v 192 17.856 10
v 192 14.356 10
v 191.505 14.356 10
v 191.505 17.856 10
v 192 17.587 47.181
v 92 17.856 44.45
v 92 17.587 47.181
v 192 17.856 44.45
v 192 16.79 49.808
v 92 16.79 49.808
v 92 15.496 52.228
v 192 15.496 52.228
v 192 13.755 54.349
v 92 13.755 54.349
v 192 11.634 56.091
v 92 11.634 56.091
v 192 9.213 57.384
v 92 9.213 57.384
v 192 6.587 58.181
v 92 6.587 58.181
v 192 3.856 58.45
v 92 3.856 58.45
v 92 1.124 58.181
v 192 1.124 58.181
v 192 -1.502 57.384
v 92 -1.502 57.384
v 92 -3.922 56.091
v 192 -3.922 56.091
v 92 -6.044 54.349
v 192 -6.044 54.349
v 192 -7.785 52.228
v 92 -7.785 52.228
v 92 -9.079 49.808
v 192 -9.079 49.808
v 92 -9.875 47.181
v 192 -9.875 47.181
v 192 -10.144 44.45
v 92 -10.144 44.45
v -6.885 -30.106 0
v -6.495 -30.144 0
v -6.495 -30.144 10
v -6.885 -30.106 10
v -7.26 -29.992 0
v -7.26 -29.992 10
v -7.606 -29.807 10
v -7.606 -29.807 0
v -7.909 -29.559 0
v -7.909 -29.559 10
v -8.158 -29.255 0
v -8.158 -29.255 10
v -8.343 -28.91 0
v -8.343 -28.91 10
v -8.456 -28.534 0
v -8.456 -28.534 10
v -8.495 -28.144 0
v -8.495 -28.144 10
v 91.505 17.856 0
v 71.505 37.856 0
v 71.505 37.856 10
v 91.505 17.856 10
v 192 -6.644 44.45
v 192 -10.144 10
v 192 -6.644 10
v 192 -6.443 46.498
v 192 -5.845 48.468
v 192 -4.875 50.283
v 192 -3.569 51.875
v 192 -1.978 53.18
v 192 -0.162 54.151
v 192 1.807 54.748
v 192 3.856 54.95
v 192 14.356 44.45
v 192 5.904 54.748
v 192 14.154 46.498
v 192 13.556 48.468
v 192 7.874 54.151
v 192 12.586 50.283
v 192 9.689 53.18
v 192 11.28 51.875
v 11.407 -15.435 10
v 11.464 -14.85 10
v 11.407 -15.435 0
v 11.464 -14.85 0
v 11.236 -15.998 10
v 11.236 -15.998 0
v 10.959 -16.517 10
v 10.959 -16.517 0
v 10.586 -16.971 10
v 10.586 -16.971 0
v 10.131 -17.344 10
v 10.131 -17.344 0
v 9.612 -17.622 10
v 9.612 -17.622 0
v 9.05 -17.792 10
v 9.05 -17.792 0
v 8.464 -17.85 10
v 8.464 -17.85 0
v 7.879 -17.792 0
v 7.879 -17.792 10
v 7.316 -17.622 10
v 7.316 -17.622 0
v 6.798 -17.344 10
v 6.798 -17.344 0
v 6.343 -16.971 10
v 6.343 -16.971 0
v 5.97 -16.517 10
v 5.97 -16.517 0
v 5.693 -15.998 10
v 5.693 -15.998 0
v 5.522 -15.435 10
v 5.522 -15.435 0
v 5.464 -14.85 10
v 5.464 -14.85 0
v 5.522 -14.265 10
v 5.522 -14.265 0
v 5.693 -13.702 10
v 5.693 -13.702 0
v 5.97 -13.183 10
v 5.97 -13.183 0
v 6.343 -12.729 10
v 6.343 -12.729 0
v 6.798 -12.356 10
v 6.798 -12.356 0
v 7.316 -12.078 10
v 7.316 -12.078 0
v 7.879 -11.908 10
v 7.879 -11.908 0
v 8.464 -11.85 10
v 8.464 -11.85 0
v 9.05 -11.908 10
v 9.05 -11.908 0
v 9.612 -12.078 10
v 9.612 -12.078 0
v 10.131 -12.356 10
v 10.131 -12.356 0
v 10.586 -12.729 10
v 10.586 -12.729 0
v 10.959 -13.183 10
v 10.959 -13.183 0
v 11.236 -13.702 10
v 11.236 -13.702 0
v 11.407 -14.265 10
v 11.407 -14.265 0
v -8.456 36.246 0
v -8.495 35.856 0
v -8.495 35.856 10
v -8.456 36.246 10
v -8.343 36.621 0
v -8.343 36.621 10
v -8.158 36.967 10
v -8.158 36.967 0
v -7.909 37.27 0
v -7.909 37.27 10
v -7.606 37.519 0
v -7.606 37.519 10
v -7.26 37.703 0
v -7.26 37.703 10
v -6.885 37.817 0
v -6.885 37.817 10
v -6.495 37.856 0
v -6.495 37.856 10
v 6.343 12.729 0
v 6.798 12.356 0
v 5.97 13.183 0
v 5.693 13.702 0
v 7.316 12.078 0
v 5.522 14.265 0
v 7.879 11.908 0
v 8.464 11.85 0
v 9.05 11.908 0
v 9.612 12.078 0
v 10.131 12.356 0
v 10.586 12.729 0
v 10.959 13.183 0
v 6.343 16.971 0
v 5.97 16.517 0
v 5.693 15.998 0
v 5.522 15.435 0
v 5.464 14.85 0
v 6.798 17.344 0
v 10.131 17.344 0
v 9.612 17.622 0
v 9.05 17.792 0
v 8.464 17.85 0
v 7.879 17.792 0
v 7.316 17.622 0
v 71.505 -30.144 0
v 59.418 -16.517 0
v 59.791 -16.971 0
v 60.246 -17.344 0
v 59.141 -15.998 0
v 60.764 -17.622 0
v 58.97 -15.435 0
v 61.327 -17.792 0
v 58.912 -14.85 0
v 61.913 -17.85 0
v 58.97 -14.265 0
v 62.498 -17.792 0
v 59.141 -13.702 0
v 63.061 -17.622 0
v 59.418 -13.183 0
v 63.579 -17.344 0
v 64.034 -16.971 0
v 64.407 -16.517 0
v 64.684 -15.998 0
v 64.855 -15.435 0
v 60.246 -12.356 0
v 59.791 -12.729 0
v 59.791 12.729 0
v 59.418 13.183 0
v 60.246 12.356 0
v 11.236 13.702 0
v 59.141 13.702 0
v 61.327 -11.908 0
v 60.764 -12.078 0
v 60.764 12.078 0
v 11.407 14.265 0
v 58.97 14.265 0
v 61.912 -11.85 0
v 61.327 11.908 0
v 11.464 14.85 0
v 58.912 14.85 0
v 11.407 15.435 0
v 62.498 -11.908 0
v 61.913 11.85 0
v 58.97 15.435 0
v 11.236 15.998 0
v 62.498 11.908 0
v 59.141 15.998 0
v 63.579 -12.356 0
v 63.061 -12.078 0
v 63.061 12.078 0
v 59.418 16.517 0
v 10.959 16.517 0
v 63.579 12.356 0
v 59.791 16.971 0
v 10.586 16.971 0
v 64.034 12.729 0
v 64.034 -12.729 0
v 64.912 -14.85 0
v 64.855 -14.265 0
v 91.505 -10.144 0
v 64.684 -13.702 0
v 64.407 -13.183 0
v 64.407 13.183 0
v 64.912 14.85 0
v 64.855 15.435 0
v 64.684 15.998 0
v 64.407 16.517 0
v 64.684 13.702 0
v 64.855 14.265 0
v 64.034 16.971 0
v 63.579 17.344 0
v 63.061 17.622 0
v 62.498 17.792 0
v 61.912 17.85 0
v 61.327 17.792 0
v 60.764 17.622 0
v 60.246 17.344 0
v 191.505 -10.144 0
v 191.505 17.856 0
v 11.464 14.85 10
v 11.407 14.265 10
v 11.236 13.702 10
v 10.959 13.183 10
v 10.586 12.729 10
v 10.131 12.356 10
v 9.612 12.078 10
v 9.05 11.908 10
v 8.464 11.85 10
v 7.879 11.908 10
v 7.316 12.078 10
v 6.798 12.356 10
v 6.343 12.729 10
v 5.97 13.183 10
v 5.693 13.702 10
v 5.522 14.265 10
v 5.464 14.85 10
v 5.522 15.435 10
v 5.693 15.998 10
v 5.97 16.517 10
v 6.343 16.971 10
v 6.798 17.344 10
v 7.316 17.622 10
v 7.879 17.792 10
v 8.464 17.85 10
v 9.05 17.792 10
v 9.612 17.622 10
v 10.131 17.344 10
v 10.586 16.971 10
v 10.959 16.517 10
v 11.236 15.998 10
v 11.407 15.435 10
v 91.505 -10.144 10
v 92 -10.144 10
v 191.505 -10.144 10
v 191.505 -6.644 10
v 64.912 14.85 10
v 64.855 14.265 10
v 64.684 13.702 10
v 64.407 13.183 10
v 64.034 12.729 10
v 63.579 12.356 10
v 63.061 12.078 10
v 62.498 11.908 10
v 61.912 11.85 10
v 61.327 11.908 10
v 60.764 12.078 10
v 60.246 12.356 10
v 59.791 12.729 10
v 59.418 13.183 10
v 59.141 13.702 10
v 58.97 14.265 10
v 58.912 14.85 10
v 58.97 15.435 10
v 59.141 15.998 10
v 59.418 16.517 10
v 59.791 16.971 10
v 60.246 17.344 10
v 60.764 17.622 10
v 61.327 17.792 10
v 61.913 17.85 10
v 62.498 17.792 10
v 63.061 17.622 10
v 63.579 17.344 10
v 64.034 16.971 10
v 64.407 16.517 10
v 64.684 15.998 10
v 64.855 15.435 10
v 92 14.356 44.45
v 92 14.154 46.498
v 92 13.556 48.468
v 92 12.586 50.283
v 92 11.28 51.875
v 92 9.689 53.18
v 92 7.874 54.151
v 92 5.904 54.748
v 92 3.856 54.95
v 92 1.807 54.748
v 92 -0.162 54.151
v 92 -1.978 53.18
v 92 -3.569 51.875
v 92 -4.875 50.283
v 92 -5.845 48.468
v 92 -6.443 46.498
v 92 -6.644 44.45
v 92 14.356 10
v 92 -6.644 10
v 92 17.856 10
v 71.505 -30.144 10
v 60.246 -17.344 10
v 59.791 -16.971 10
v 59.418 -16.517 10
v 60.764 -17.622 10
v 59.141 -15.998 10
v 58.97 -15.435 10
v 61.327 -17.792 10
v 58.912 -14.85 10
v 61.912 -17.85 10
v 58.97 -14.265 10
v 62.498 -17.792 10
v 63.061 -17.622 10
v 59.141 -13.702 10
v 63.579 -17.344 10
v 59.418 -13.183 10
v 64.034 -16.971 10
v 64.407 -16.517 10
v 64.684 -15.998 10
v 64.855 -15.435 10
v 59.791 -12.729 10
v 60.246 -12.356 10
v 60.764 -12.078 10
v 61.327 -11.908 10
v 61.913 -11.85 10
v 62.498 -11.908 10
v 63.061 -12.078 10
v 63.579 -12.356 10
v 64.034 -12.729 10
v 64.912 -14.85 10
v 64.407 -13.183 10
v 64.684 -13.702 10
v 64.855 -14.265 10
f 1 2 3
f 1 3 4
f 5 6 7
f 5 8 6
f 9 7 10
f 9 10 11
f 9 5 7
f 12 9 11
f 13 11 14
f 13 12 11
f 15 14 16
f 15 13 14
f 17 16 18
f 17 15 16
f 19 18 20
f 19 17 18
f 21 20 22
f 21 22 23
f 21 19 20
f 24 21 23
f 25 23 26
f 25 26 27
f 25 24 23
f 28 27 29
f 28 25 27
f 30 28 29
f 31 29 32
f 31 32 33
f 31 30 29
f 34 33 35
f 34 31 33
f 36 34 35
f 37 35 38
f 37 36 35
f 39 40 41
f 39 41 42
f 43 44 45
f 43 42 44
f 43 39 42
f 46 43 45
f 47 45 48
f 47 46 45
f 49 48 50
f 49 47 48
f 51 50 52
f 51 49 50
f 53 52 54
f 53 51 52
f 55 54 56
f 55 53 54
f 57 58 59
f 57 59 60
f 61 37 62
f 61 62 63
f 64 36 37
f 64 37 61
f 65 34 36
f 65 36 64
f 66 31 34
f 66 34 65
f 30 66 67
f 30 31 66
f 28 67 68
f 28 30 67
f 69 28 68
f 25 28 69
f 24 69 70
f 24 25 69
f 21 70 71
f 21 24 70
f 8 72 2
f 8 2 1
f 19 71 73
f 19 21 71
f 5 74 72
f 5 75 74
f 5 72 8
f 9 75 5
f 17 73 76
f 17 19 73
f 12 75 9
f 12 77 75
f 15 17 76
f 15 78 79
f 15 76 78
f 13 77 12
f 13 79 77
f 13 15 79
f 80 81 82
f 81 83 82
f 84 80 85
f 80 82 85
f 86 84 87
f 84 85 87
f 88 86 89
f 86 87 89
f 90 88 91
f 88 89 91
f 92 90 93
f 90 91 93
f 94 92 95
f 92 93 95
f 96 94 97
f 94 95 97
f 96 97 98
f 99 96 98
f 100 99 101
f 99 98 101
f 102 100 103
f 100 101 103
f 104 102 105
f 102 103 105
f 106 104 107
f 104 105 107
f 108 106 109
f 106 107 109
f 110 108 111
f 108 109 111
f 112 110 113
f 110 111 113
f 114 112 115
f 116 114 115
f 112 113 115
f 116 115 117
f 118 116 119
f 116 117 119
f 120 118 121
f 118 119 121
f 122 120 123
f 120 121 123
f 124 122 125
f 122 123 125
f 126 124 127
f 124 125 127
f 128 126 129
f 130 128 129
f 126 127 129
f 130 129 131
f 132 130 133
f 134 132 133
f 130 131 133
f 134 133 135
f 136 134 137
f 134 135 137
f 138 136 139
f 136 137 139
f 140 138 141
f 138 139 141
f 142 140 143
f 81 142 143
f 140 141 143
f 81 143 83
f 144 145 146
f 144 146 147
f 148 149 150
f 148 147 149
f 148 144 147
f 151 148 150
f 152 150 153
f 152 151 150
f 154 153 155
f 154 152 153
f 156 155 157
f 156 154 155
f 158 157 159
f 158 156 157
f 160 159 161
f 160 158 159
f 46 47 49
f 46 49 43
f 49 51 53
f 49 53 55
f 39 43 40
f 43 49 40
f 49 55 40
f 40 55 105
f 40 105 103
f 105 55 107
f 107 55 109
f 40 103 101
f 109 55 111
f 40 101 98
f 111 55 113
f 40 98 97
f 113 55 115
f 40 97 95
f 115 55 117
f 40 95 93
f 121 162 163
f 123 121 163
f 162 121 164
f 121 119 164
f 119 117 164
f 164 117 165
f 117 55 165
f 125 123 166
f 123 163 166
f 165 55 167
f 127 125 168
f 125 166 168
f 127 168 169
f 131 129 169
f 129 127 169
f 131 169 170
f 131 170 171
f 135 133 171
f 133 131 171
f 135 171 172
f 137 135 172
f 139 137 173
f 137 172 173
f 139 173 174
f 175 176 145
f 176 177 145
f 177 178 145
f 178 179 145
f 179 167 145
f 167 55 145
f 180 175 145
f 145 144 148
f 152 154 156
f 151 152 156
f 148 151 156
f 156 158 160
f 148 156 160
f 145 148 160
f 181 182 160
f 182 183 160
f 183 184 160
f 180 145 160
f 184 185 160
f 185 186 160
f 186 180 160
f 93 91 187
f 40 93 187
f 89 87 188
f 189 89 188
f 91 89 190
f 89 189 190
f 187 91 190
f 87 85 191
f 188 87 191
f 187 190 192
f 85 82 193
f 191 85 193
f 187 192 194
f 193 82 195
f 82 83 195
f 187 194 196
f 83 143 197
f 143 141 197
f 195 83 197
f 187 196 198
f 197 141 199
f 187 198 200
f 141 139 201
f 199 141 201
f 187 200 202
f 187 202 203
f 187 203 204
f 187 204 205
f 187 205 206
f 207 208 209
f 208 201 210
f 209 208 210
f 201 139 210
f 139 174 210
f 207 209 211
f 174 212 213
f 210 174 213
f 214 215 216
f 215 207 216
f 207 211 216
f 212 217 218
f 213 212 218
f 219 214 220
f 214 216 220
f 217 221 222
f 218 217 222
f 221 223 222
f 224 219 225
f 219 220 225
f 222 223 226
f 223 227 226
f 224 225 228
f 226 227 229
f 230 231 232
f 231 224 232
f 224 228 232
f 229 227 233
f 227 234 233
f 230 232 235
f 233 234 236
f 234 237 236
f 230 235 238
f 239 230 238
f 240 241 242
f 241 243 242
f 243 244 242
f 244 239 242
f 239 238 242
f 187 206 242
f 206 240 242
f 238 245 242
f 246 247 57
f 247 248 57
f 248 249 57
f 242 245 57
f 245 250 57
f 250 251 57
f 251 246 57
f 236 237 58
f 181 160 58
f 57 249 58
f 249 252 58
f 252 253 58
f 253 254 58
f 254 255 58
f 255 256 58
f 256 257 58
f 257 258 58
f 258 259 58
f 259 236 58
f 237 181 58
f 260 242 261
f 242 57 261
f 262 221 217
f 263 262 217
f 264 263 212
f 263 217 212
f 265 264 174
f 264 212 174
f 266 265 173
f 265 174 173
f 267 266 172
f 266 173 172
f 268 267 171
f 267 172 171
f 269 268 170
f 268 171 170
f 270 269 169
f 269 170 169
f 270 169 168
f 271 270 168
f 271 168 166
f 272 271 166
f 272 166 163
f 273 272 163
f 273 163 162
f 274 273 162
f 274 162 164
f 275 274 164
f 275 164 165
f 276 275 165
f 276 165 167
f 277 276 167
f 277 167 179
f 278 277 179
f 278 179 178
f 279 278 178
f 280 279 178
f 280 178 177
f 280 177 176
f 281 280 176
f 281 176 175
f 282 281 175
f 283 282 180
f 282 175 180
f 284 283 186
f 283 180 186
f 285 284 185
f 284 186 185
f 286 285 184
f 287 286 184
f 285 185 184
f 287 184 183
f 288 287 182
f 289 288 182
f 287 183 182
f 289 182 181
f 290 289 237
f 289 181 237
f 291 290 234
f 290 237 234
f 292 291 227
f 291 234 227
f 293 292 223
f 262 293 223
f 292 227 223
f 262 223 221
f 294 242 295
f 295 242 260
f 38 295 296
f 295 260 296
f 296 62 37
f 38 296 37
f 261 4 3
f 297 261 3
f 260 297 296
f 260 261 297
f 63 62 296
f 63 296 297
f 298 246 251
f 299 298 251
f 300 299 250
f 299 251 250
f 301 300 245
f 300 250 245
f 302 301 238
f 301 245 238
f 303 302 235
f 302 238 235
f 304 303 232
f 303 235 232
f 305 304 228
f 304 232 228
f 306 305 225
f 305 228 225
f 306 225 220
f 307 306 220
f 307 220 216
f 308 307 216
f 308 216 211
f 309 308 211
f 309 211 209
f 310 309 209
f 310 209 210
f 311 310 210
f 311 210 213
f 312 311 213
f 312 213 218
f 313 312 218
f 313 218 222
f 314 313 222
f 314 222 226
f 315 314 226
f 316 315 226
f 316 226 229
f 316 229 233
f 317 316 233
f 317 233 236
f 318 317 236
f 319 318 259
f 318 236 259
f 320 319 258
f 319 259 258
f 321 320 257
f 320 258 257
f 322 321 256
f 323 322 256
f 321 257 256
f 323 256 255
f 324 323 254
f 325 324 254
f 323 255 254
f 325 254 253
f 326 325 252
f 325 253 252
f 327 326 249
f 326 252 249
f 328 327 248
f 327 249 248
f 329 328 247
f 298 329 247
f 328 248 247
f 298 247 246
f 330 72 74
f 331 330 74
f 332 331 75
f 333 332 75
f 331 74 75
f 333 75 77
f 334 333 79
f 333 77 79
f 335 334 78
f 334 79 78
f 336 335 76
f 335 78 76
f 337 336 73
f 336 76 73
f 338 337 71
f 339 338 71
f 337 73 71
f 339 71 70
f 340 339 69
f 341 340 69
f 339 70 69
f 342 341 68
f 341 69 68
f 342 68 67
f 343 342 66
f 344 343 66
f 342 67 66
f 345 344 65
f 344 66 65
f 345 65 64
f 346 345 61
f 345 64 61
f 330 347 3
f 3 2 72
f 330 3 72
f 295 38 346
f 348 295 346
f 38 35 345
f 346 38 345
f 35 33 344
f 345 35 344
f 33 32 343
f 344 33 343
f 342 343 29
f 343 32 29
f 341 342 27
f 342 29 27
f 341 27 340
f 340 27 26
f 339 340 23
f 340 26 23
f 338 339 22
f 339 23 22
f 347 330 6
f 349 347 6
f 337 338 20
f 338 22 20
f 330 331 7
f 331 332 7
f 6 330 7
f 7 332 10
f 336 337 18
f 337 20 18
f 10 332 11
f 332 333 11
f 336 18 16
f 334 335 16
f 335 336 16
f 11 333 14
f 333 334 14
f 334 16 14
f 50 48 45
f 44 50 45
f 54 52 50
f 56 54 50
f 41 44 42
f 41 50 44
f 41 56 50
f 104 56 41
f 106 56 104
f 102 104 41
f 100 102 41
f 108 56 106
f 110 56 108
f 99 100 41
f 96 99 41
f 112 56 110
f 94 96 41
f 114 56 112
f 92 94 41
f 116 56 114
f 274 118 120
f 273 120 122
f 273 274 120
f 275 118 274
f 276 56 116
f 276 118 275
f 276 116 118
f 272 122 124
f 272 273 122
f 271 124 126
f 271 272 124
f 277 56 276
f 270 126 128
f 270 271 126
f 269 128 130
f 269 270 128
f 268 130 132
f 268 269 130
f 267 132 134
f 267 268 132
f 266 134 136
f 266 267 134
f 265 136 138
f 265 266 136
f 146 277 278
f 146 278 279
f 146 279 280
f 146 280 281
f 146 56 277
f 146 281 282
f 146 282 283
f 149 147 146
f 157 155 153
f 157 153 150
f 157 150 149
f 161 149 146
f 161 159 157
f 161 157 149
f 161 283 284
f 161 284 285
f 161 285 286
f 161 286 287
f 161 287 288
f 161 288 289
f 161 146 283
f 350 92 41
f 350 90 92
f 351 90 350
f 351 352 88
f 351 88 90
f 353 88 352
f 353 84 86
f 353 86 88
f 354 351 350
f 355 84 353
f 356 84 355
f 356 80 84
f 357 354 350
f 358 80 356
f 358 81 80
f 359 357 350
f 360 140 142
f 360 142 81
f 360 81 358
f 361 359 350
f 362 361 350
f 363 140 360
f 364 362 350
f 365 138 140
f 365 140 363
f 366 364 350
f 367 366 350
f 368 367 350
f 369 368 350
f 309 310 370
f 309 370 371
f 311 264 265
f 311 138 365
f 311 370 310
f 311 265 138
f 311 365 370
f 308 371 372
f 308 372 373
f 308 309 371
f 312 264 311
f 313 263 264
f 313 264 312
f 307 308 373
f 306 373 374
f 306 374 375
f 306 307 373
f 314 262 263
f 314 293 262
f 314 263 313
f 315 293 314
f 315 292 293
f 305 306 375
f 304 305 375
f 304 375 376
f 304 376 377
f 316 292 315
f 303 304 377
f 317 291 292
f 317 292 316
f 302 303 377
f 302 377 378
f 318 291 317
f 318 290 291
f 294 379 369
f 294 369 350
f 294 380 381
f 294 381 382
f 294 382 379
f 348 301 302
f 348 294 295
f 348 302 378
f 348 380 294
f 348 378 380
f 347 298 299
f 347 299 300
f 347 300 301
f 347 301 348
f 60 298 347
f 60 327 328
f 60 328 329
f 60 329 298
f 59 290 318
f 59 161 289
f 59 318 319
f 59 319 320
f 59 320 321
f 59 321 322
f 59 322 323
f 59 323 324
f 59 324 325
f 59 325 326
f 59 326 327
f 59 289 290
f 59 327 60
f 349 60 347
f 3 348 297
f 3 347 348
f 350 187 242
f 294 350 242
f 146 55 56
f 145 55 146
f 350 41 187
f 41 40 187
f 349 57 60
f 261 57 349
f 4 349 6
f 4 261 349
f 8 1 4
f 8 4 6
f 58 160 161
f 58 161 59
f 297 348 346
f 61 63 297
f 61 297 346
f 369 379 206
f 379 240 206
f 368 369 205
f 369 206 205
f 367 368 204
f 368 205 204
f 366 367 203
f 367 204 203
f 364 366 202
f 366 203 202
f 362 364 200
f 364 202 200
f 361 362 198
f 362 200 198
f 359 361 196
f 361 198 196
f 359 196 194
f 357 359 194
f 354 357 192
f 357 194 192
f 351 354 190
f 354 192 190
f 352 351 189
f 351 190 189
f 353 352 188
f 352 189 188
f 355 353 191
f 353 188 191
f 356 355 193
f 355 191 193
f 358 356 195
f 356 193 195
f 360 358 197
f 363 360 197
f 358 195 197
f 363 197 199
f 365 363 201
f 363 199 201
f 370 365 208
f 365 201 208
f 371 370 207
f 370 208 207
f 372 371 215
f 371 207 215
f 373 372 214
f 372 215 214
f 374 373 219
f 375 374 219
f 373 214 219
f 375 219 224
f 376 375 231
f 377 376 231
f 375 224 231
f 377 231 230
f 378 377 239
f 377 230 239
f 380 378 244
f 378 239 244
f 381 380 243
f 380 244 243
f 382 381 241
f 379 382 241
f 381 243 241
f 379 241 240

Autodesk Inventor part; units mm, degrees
ref_plane "XZ Plane" through (0, 0, 0) normal (0, 1, 0) x (-1, 0, 0)
ref_plane "XY Plane" through (0, 0, 0) normal (0, 0, 1) x (1, 0, 0)
sketch "Sketch4" plane through (0, 0, 0) normal (0, 0, 1) x (1, 0, 0)
  line L0 (-8.4948, -28.1443) -> (-8.4948, 35.8557)
  line L1 (-6.4948, 37.8557) -> (71.5052, 37.8557)
  line L2 (71.5052, 37.8557) -> (91.5052, 17.8557)
  line L3 (-6.4948, -30.1443) -> (71.5052, -30.1443)
  line L4 (71.5052, -30.1443) -> (91.5052, -10.1443)
  line L5 (91.5052, -10.1443) -> (91.5052, 17.8557)
  line L6 (91.5052, 17.8557) -> (191.5052, 17.8557)
  line L7 (191.5052, 17.8557) -> (191.5052, -10.1443)
  line L8 (191.5052, -10.1443) -> (91.5052, -10.1443)
  arc A0 (-6.4948, 37.8557) -> (-8.4948, 35.8557) centre (-6.4948, 35.8557) ccw
  arc A1 (-8.4948, -28.1443) -> (-6.4948, -30.1443) centre (-6.4948, -28.1443) ccw
  line L9 (71.5052, 37.8557) -> (91.5052, 17.8557)
  line L10 (71.5052, -30.1443) -> (91.5052, -10.1443)
  line L11 (91.5052, 17.8557) -> (91.5052, -10.1443)
  point P0 (0, 0)
  point P1 (-8.4948, -30.1443)
  point P2 (-8.4948, 37.8557)
  dimension "d7" = 68
  dimension "d8" = 80
  dimension "d9" = 80
  dimension "d10" = 135
  dimension "d11" = 135
  dimension "d12" = 20
  dimension "d13" = 20
  dimension "d14" = 28
  dimension "d15" = 2
  dimension "d16" = 2
  dimension "d19" = 100
extrude "Extrusion2" add sketch "Sketch4" along normal blind 10
ref_plane "Work Plane1" through (192, 0, 0) normal (1, 0, 0) x (0, 1, 0)
sketch "Sketch5" plane through (192, 0, 0) normal (1, 0, 0) x (0, 1, 0)
  line L0 (17.8557, 10) -> (17.8557, 44.45)
  line L1 (-10.1443, 0) -> (-10.1443, 10) projected
  line L2 (-10.1443, 10) -> (-10.1443, 44.45)
  arc A0 (17.8557, 44.45) -> (-10.1443, 44.45) centre (3.8557, 44.45) ccw
  line L3 (14.3557, 10) -> (14.3557, 44.45)
  line L4 (-6.6443, 10) -> (-6.6443, 44.45)
  arc A1 (14.3557, 44.45) -> (-6.6443, 44.45) centre (3.8557, 44.45) ccw
  line L5 (14.3557, 44.45) -> (14.3557, 10)
  line L6 (-6.6443, 44.45) -> (-6.6443, 10)
  line L7 (-10.1443, 10) -> (17.8557, 10) projected
  line L8 (17.8557, 10) -> (14.3557, 10)
  line L9 (-6.6443, 10) -> (-10.1443, 10)
  point P0 (0, 0)
  dimension "d21" = 34.45
  dimension "d22" = 3.5
  dimension "d23" = 3.5
extrude "Extrusion3" add sketch "Sketch5" against normal blind 100 contours L7 L3 A1 L4 L2 A0 L0
sketch "Sketch6" plane through (0, 0, 0) normal (0, 0, 1) x (1, 0, 0)
  line L0 (-54.1714, 0) -> (81.2571, 0)
  line L1 (8.4643, 0) -> (8.4643, 14.85)
  line L2 (8.4643, 0) -> (8.4643, -14.85)
  circle A0 centre (8.4643, 14.85) radius 3
  circle A1 centre (8.4643, -14.85) radius 3
  line L3 (61.9125, 0) -> (61.9125, 14.85)
  line L4 (61.9125, 0) -> (61.9125, -14.85)
  circle A2 centre (61.9125, 14.85) radius 3
  circle A3 centre (61.9125, -14.85) radius 3
  point P0 (0, 0)
  dimension "d26" = 14.85
  dimension "d27" = 14.85
  dimension "d28" = 6
  dimension "d29" = 6
  dimension "d30" = 14.85
  dimension "d31" = 14.85
  dimension "d32" = 6
  dimension "d33" = 6
extrude "Extrusion4" cut sketch "Sketch6" along normal blind 10
thread "Thread1" size "M6x1" class "6H" standard "ANSI Metric M Profile" full length
thread "Thread2" size "M6x1" class "6H" standard "ANSI Metric M Profile" full length
thread "Thread3" size "M6x1" class "6H" standard "ANSI Metric M Profile" full length
thread "Thread4" size "M6x1" class "6H" standard "ANSI Metric M Profile" full length
properties part number "WireHolderPiece1"
